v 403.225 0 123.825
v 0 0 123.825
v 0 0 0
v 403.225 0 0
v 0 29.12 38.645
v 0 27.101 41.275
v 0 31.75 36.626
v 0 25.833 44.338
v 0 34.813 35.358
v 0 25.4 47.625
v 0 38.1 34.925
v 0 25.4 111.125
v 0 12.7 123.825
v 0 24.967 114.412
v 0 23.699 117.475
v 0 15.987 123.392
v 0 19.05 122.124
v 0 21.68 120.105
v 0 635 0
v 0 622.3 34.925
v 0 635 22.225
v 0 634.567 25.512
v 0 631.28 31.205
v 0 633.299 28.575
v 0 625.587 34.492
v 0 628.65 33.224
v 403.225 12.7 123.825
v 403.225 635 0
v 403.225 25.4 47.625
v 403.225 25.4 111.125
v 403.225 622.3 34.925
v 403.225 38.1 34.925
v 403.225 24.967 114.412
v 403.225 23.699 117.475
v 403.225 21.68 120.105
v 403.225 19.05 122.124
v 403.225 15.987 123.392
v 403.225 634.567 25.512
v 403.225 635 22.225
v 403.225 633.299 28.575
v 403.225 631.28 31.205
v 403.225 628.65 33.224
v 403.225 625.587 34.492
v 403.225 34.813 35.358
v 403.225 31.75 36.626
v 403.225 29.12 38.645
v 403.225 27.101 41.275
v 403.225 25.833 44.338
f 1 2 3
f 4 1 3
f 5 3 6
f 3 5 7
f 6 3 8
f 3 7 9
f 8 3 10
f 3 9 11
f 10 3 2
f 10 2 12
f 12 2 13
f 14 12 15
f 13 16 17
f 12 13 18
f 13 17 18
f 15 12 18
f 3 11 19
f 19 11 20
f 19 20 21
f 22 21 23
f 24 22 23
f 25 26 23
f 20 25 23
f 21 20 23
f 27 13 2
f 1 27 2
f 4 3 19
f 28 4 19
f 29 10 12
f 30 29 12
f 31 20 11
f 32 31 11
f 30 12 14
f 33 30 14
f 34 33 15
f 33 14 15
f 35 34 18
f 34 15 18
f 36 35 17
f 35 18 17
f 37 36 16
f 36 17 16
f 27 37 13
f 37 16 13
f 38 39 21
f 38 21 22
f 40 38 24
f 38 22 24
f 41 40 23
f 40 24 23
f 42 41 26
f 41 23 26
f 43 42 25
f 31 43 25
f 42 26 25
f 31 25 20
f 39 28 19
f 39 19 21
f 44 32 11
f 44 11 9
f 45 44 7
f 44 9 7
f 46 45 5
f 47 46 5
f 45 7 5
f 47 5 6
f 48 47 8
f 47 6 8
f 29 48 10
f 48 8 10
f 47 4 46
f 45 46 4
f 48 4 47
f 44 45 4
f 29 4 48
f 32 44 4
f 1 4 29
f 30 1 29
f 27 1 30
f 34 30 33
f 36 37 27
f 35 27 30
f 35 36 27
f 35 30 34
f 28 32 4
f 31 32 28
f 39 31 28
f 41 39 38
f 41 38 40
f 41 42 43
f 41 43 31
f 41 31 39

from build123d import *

# Parameters (mm, degrees)
F1_DEPTH = 403.225


with BuildPart() as f1:
    # F0 (on Right) → F1 (new body)
    with BuildSketch(Plane.YZ):
        with BuildLine():
            Line((0, 123.825), (0, 0))
            Line((0, 0), (635, 0))
            Line((635, 0), (635, 22.225))
            ThreePointArc((635, 22.225), (631.280256, 31.205256), (622.3, 34.925))
            Line((622.3, 34.925), (38.1, 34.925))
            ThreePointArc((38.1, 34.925), (29.119744, 38.644744), (25.4, 47.625))
            Line((25.4, 47.625), (25.4, 111.125))
            ThreePointArc((25.4, 111.125), (21.680256, 120.105256), (12.7, 123.825))
            Line((12.7, 123.825), (0, 123.825))
        make_face()
    extrude(amount=F1_DEPTH)


solid = f1.part
